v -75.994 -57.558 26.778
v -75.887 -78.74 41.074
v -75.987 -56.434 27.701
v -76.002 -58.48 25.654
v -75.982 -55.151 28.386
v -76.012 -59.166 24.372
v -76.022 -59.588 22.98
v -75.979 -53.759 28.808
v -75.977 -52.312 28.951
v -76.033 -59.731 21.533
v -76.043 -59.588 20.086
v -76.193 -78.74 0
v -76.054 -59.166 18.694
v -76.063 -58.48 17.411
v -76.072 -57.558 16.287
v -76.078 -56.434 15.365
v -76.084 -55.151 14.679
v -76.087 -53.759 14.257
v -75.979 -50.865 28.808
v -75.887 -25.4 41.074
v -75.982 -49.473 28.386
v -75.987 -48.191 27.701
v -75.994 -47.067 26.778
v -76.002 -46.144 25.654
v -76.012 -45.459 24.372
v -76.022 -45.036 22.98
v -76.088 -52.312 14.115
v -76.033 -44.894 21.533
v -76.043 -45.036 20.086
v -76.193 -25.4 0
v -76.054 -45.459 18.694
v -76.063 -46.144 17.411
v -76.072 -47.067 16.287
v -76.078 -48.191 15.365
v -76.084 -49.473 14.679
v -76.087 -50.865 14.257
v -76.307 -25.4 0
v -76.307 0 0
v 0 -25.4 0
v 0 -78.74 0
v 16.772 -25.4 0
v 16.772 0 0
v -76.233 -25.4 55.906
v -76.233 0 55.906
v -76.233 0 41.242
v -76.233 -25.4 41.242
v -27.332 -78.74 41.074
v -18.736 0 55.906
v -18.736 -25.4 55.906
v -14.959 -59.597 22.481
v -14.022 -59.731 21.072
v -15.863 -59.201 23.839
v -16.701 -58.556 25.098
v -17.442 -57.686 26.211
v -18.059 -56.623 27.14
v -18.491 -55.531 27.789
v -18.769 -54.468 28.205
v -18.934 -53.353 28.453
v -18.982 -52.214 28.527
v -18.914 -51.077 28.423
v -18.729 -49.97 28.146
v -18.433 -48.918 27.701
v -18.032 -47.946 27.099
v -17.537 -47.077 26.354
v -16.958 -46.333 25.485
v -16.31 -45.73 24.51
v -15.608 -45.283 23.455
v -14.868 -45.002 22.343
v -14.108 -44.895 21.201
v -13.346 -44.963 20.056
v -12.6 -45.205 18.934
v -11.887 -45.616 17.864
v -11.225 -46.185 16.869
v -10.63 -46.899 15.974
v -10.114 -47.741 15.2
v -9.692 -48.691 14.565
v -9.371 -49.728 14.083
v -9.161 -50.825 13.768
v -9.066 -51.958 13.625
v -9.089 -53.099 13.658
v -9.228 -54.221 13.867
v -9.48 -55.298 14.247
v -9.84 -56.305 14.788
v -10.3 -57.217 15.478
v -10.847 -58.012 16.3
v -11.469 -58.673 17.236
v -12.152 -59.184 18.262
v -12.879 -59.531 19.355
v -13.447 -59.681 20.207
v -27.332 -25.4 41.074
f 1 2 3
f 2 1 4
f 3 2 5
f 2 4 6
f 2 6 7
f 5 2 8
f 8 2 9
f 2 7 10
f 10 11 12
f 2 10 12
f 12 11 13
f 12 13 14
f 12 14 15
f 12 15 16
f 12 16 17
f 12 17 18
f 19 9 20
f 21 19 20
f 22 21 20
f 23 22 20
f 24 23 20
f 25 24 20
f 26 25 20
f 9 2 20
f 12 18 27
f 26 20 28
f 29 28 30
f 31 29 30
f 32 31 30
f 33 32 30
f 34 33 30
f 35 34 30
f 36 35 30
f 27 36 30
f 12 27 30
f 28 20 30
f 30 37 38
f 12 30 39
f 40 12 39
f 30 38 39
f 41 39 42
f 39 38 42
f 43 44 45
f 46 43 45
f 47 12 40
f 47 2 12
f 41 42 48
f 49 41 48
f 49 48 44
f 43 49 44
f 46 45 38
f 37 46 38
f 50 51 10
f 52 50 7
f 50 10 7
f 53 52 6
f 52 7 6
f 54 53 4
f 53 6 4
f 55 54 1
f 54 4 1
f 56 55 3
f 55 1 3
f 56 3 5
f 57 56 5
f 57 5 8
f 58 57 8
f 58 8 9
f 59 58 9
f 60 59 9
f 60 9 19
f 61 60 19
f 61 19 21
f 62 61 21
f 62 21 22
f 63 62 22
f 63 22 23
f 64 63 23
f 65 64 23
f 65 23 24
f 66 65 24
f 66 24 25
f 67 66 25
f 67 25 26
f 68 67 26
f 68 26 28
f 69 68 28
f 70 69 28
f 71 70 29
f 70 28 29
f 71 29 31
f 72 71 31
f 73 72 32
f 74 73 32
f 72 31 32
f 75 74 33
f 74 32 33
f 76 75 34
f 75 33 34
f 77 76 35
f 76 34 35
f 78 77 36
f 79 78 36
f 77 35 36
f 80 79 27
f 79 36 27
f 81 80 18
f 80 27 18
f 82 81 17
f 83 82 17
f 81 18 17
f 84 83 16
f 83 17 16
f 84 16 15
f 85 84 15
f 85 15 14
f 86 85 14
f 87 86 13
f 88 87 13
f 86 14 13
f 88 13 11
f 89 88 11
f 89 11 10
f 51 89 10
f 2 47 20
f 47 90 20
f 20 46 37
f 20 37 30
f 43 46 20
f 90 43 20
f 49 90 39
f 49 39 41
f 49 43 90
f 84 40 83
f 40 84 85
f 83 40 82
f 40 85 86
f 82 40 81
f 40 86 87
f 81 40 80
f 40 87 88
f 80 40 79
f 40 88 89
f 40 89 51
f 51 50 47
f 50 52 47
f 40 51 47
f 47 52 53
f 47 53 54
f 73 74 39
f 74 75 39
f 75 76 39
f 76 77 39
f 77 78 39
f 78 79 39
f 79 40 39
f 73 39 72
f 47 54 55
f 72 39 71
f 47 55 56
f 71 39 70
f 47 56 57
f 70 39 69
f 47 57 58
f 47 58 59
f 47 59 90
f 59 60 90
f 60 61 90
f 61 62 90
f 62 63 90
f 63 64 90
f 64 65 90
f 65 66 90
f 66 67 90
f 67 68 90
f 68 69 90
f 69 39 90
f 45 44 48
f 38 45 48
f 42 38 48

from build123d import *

# Parameters (mm, degrees)
F1_DEPTH = 68.58
F3_DEPTH = 25.4
F4_DEPTH = 10.16
F5_R     = 7.4183703621
F6_DEPTH = 127


with BuildPart() as f1:
    # F0 (on Front) → F1 (new body)
    with BuildSketch(Plane.XZ):
        Polygon((-76.1927291751, 0), (0, 0), (-27.3316595703, 41.0738363862), (-75.8873522282, 41.0738363862), align=None)
    extrude(amount=F1_DEPTH)

    # F2 (on Front) → F3 (join)
    with BuildSketch(Plane.XZ):
        Polygon((-18.7361260581, 55.9061877429), (-76.2327313423, 55.9061877429), (-76.2327313423, 41.2422679365), (-76.3068795204, 0), (0, 0), (16.7718548328, 0), align=None)
    extrude(amount=F3_DEPTH)

    # F4 (add): a face of the model
    f4_faces = [f1.faces().sort_by_distance(p)[0] for p in [
        (-44.3539801272, -68.58, 19.0203203617),
    ]]
    extrude(f4_faces, amount=F4_DEPTH)

    # F5 (on face) → F6 (cut)
    with BuildSketch(Plane(origin=(-76.1885177267, 0, 0.5664485955), x_dir=(0, -1, 0), z_dir=(-0.9999723628, 0, 0.0074346234))):
        with Locations((52.3121915758, 20.9668856114)):
            Circle(F5_R)
    extrude(amount=-F6_DEPTH, mode=Mode.SUBTRACT)


solid = f1.part
